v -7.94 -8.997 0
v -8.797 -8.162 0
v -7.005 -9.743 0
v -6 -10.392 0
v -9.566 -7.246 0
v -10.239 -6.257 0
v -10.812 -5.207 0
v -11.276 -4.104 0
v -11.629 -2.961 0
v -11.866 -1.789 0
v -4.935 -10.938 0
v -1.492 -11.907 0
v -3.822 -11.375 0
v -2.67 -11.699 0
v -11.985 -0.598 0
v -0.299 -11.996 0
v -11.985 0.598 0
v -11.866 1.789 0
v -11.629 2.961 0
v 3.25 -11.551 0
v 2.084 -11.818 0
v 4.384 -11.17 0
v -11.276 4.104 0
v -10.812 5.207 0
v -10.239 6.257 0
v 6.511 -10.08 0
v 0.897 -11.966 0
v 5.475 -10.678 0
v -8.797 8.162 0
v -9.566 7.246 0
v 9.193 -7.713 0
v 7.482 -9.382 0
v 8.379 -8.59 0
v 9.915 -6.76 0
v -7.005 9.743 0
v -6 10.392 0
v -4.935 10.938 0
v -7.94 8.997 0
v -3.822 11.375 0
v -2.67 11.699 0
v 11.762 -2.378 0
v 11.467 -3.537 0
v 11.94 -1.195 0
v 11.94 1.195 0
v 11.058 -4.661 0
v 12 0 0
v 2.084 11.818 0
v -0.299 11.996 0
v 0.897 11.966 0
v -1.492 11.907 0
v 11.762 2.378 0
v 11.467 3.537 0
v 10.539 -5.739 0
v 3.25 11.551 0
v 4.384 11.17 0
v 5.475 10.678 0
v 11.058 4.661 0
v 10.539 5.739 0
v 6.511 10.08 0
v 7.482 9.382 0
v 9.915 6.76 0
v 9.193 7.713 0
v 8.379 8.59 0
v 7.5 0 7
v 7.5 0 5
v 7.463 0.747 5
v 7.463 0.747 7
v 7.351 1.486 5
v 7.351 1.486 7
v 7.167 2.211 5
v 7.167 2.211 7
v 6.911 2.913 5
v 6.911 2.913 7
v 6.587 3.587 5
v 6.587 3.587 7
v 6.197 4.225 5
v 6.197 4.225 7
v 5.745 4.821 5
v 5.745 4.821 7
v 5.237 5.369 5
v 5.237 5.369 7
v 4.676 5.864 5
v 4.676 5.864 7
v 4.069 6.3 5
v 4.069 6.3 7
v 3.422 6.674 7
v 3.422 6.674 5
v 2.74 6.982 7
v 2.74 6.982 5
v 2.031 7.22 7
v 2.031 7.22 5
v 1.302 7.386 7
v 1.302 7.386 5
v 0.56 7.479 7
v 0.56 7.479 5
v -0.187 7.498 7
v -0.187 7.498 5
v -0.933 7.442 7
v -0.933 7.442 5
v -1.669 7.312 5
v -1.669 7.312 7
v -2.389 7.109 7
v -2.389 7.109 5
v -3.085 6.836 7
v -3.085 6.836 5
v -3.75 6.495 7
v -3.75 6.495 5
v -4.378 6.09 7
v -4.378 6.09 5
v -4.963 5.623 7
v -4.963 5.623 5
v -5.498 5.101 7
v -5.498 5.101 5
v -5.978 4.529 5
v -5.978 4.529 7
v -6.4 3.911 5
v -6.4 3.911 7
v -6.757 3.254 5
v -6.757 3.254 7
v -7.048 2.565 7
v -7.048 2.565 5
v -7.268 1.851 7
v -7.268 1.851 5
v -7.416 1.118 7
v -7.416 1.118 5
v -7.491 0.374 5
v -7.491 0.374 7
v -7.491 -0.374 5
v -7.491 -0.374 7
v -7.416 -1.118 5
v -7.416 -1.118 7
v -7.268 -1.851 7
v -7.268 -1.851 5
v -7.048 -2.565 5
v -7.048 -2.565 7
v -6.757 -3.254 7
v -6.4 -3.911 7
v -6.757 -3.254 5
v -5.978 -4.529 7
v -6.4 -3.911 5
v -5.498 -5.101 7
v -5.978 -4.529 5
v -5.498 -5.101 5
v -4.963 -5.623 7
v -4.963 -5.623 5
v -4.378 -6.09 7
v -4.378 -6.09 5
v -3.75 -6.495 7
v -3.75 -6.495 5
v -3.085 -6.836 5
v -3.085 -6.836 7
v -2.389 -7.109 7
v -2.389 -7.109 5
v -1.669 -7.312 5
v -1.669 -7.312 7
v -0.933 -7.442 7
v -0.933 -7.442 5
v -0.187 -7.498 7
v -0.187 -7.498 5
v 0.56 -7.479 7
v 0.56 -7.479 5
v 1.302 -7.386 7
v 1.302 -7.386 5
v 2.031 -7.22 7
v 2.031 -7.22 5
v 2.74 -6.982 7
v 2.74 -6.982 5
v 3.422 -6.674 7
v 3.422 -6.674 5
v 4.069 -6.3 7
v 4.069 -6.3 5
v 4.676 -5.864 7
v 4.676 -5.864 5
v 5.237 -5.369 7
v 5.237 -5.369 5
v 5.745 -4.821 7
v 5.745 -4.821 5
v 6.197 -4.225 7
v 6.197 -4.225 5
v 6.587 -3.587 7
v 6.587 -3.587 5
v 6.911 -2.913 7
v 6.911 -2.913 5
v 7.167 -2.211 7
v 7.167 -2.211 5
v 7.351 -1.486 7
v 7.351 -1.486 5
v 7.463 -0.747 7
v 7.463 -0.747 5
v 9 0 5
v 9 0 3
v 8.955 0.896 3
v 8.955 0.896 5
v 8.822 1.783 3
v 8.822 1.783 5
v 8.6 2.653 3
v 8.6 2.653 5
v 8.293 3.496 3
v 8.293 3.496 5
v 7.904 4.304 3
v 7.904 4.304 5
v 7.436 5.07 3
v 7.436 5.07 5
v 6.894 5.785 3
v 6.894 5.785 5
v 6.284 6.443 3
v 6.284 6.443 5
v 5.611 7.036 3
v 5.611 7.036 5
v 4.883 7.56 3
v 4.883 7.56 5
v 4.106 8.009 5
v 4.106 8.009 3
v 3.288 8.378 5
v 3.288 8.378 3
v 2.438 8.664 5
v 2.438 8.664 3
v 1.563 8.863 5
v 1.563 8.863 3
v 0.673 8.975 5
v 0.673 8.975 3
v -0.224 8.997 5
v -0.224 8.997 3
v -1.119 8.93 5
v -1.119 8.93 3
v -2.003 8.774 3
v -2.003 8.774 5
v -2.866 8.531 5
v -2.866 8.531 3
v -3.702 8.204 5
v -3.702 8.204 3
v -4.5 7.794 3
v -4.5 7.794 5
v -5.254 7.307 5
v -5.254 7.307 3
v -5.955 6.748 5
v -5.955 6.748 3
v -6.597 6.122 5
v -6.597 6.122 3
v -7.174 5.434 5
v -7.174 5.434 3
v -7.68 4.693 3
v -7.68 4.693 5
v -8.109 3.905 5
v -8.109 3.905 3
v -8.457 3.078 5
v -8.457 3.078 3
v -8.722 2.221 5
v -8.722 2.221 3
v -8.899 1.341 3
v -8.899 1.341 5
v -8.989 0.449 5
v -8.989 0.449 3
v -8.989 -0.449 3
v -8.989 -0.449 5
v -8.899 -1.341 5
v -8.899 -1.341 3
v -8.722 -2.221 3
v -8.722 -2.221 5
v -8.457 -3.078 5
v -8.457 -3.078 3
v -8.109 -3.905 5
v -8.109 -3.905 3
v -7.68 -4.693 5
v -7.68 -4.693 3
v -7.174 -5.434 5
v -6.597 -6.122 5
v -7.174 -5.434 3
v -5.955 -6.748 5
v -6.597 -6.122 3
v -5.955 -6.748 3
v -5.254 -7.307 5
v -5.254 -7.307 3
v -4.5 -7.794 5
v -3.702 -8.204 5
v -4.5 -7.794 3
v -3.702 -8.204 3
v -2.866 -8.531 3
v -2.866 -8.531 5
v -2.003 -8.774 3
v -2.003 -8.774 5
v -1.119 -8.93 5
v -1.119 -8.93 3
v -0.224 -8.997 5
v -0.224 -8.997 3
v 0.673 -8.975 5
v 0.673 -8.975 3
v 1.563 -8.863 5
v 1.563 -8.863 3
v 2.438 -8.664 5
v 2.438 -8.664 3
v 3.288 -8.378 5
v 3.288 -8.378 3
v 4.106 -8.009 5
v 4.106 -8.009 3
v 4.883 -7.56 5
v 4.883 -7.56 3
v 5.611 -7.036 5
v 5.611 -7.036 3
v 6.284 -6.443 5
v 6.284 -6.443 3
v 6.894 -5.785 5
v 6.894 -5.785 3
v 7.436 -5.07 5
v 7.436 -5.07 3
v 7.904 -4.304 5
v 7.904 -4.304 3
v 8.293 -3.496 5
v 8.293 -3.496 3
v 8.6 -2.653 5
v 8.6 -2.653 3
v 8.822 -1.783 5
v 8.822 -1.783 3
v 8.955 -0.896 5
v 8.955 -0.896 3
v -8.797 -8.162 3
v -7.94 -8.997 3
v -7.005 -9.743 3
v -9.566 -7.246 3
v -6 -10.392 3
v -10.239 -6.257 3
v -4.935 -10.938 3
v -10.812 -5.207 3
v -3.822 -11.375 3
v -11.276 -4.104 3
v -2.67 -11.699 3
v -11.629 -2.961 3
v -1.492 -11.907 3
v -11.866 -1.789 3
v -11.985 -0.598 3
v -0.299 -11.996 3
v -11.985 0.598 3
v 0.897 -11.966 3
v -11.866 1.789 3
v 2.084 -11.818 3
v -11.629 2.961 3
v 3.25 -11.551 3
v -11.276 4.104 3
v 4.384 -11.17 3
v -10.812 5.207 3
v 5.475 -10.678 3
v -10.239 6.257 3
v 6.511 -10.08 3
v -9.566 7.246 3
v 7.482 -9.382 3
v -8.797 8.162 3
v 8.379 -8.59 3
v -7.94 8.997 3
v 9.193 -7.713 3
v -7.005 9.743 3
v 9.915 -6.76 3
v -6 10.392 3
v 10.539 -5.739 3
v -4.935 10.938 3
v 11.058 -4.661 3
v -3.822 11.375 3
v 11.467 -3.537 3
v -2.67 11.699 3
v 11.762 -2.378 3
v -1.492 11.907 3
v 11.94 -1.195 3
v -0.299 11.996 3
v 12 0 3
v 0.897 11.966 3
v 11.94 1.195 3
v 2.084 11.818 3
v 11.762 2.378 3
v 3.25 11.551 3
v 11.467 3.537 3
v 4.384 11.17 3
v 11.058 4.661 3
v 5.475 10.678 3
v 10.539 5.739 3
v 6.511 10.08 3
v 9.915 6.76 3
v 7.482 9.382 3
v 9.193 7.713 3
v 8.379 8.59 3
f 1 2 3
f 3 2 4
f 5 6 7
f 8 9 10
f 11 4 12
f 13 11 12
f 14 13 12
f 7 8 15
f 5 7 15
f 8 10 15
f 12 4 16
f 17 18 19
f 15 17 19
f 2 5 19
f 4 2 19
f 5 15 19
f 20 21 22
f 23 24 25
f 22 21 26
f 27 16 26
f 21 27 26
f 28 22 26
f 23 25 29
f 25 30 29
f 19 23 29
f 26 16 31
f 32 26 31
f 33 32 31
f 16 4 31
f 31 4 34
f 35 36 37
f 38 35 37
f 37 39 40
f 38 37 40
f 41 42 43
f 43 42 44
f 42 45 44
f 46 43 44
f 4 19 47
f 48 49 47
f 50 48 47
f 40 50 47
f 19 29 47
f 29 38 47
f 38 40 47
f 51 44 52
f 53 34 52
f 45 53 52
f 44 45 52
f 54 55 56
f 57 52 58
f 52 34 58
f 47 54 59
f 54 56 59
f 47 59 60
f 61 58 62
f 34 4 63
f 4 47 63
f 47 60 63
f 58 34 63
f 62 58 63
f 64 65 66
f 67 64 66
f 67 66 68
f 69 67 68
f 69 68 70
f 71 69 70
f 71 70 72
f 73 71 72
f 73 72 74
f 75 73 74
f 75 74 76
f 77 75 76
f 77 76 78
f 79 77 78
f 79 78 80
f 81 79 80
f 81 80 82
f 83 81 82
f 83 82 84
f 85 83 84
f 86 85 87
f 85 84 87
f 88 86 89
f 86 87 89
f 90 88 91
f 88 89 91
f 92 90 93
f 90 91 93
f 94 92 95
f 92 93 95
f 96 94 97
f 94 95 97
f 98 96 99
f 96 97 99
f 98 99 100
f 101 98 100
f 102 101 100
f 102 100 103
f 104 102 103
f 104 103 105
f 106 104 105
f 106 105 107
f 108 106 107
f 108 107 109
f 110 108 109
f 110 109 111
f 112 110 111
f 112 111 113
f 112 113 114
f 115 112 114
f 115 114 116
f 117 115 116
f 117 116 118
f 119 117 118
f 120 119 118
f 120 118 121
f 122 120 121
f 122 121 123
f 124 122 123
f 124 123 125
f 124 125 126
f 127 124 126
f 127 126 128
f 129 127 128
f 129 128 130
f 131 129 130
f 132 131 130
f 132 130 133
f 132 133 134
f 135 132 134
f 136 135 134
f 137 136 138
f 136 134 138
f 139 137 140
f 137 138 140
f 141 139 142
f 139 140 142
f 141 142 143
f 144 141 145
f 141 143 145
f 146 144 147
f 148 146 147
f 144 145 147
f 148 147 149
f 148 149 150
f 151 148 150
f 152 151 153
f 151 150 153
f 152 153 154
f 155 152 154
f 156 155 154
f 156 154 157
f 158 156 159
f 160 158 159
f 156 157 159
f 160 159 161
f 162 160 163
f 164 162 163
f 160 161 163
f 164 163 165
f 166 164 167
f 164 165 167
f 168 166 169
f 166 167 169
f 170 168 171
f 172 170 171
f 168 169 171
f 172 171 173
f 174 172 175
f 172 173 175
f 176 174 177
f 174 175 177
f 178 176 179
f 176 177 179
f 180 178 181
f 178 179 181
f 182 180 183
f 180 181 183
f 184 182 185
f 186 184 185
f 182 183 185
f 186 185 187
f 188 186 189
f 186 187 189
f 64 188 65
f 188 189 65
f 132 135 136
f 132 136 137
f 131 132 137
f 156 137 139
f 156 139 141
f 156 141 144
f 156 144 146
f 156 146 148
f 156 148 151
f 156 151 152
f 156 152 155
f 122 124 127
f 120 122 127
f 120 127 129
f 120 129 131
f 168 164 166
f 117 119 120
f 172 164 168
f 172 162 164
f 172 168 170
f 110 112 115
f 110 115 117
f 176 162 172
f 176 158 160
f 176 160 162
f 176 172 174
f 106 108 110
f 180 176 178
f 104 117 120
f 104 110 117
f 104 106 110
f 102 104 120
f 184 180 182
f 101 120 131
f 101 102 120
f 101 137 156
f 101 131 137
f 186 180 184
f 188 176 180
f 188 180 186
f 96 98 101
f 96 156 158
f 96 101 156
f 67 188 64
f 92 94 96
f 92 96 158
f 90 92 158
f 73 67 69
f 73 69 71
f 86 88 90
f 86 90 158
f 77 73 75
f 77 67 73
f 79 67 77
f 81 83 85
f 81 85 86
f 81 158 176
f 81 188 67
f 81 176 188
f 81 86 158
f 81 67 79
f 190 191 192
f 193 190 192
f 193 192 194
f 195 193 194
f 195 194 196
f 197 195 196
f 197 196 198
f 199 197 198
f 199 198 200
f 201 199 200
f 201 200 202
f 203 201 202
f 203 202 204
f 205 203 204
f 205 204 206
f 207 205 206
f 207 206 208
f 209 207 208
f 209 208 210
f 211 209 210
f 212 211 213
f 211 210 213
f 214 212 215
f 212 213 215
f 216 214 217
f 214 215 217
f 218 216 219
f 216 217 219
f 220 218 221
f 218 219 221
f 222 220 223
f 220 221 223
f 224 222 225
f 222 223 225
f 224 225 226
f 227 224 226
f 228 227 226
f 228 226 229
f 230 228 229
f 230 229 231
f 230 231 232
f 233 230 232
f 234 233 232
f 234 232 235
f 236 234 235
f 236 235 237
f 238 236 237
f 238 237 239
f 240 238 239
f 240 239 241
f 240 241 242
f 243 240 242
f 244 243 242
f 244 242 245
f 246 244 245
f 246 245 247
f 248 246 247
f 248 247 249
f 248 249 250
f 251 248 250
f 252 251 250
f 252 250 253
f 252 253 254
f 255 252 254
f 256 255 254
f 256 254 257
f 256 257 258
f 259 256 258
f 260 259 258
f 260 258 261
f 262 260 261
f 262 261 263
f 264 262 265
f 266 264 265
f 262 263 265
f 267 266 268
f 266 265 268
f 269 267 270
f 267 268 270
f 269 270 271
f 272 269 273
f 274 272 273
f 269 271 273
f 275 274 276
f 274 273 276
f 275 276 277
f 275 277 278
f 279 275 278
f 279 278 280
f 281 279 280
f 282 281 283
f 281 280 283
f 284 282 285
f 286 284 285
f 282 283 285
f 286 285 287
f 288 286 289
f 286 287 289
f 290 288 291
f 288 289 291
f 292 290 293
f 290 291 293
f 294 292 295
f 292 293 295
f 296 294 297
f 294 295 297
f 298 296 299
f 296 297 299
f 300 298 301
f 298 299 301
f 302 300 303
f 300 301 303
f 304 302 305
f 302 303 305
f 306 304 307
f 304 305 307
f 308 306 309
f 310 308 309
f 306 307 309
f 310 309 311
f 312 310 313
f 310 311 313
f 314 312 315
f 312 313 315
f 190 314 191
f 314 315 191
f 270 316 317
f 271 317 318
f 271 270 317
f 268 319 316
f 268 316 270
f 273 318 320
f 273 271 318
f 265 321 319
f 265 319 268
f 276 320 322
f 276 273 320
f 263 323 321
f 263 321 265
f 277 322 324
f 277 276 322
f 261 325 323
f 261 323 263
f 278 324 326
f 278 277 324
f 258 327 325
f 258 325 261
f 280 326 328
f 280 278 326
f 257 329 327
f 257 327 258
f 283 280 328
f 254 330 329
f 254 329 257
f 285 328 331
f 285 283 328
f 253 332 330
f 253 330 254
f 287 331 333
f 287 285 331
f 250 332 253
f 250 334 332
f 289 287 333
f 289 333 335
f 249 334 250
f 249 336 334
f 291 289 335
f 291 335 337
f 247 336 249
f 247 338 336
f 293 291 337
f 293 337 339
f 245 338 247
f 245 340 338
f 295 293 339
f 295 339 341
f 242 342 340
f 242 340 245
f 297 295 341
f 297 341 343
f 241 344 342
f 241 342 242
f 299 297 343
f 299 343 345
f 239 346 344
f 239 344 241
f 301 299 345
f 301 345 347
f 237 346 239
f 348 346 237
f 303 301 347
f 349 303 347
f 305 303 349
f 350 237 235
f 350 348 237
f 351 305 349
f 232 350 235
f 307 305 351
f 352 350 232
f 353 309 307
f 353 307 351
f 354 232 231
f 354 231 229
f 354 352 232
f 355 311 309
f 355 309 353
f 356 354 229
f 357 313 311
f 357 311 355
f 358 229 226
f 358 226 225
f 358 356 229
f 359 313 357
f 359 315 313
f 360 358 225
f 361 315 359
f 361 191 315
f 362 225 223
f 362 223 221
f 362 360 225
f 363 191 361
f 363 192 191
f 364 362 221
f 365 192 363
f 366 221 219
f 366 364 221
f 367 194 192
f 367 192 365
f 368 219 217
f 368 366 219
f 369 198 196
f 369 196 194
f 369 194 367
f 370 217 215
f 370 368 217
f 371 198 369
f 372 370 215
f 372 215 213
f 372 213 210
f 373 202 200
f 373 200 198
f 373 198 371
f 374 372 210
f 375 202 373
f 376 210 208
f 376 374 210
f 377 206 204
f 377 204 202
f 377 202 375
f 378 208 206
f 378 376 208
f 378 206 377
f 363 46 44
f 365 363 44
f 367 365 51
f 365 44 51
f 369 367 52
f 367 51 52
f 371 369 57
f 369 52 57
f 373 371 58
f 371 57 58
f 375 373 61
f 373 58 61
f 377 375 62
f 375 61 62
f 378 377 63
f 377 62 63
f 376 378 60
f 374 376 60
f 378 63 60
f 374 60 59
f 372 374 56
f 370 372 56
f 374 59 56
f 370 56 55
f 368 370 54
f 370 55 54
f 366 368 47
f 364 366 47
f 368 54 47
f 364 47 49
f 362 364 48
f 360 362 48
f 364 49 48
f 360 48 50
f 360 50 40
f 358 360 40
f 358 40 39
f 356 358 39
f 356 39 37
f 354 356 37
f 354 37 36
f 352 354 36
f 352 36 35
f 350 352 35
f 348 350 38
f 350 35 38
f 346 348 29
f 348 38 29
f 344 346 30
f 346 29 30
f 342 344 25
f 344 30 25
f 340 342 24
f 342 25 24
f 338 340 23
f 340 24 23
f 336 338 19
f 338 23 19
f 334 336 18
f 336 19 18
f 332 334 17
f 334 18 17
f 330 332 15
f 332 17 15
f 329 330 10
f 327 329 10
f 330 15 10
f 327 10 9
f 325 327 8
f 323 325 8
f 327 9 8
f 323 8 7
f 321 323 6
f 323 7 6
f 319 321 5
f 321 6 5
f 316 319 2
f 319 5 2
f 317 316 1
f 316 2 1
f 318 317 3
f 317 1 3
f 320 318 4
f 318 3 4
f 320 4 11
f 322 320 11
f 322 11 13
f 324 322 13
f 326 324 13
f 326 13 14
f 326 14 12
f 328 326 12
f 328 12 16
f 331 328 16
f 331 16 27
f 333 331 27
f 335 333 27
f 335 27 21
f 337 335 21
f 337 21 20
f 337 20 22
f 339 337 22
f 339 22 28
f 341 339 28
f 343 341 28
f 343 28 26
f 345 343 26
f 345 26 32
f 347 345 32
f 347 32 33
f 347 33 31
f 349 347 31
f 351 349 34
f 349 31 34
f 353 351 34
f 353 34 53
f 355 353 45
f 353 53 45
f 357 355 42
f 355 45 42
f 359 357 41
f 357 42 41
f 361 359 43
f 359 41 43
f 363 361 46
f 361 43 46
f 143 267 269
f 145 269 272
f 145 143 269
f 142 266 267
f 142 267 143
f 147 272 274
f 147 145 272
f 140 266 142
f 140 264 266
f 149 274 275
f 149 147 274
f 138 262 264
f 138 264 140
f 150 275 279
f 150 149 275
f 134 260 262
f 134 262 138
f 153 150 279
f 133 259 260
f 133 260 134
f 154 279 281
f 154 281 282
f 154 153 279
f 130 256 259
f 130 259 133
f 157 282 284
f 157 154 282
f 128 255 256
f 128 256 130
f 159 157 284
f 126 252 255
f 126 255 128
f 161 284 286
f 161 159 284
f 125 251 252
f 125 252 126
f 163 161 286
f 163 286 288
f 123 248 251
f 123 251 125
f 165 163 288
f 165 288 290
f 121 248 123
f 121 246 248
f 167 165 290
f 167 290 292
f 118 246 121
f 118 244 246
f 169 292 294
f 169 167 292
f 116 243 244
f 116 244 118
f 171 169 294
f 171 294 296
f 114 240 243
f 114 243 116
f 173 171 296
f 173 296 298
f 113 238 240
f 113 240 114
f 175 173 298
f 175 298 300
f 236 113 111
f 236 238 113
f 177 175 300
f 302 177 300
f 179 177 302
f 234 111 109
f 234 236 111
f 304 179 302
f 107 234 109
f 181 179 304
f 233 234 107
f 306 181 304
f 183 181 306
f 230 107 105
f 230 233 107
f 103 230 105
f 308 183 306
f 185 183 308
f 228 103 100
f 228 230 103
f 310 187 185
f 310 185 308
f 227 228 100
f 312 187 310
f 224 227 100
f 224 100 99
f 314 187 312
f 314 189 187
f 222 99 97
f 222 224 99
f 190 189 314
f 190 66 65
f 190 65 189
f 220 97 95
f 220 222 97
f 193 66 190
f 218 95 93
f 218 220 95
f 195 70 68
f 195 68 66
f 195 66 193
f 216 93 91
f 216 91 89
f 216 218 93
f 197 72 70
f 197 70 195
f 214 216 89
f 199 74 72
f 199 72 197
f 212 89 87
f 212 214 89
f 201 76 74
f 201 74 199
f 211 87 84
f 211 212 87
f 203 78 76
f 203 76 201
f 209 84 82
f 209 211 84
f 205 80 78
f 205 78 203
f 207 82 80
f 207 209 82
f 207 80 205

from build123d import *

# Parameters (mm, degrees)
SKETCH001_R      = 9
EXTRUDE001_DEPTH = 5
SKETCH004_R      = 12
EXTRUDE004_DEPTH = 3
SKETCH_R         = 7.5
EXTRUDE_DEPTH    = 7


with BuildPart() as extrude001:
    # Sketch001 → Extrude001 (new body)
    with BuildSketch(Plane.XY):
        Circle(SKETCH001_R)
    extrude(amount=EXTRUDE001_DEPTH)


with BuildPart() as extrude004:
    # Sketch004 → Extrude004 (new body)
    with BuildSketch(Plane.XY):
        Circle(SKETCH004_R)
    extrude(amount=EXTRUDE004_DEPTH)


with BuildPart() as fusion:
    # Sketch → Extrude (new body)
    with BuildSketch(Plane.XY):
        Circle(SKETCH_R)
    extrude(amount=EXTRUDE_DEPTH)

    # Fusion: union Extrude001, Extrude004
    add(extrude001.part)
    add(extrude004.part)


solid = fusion.part
